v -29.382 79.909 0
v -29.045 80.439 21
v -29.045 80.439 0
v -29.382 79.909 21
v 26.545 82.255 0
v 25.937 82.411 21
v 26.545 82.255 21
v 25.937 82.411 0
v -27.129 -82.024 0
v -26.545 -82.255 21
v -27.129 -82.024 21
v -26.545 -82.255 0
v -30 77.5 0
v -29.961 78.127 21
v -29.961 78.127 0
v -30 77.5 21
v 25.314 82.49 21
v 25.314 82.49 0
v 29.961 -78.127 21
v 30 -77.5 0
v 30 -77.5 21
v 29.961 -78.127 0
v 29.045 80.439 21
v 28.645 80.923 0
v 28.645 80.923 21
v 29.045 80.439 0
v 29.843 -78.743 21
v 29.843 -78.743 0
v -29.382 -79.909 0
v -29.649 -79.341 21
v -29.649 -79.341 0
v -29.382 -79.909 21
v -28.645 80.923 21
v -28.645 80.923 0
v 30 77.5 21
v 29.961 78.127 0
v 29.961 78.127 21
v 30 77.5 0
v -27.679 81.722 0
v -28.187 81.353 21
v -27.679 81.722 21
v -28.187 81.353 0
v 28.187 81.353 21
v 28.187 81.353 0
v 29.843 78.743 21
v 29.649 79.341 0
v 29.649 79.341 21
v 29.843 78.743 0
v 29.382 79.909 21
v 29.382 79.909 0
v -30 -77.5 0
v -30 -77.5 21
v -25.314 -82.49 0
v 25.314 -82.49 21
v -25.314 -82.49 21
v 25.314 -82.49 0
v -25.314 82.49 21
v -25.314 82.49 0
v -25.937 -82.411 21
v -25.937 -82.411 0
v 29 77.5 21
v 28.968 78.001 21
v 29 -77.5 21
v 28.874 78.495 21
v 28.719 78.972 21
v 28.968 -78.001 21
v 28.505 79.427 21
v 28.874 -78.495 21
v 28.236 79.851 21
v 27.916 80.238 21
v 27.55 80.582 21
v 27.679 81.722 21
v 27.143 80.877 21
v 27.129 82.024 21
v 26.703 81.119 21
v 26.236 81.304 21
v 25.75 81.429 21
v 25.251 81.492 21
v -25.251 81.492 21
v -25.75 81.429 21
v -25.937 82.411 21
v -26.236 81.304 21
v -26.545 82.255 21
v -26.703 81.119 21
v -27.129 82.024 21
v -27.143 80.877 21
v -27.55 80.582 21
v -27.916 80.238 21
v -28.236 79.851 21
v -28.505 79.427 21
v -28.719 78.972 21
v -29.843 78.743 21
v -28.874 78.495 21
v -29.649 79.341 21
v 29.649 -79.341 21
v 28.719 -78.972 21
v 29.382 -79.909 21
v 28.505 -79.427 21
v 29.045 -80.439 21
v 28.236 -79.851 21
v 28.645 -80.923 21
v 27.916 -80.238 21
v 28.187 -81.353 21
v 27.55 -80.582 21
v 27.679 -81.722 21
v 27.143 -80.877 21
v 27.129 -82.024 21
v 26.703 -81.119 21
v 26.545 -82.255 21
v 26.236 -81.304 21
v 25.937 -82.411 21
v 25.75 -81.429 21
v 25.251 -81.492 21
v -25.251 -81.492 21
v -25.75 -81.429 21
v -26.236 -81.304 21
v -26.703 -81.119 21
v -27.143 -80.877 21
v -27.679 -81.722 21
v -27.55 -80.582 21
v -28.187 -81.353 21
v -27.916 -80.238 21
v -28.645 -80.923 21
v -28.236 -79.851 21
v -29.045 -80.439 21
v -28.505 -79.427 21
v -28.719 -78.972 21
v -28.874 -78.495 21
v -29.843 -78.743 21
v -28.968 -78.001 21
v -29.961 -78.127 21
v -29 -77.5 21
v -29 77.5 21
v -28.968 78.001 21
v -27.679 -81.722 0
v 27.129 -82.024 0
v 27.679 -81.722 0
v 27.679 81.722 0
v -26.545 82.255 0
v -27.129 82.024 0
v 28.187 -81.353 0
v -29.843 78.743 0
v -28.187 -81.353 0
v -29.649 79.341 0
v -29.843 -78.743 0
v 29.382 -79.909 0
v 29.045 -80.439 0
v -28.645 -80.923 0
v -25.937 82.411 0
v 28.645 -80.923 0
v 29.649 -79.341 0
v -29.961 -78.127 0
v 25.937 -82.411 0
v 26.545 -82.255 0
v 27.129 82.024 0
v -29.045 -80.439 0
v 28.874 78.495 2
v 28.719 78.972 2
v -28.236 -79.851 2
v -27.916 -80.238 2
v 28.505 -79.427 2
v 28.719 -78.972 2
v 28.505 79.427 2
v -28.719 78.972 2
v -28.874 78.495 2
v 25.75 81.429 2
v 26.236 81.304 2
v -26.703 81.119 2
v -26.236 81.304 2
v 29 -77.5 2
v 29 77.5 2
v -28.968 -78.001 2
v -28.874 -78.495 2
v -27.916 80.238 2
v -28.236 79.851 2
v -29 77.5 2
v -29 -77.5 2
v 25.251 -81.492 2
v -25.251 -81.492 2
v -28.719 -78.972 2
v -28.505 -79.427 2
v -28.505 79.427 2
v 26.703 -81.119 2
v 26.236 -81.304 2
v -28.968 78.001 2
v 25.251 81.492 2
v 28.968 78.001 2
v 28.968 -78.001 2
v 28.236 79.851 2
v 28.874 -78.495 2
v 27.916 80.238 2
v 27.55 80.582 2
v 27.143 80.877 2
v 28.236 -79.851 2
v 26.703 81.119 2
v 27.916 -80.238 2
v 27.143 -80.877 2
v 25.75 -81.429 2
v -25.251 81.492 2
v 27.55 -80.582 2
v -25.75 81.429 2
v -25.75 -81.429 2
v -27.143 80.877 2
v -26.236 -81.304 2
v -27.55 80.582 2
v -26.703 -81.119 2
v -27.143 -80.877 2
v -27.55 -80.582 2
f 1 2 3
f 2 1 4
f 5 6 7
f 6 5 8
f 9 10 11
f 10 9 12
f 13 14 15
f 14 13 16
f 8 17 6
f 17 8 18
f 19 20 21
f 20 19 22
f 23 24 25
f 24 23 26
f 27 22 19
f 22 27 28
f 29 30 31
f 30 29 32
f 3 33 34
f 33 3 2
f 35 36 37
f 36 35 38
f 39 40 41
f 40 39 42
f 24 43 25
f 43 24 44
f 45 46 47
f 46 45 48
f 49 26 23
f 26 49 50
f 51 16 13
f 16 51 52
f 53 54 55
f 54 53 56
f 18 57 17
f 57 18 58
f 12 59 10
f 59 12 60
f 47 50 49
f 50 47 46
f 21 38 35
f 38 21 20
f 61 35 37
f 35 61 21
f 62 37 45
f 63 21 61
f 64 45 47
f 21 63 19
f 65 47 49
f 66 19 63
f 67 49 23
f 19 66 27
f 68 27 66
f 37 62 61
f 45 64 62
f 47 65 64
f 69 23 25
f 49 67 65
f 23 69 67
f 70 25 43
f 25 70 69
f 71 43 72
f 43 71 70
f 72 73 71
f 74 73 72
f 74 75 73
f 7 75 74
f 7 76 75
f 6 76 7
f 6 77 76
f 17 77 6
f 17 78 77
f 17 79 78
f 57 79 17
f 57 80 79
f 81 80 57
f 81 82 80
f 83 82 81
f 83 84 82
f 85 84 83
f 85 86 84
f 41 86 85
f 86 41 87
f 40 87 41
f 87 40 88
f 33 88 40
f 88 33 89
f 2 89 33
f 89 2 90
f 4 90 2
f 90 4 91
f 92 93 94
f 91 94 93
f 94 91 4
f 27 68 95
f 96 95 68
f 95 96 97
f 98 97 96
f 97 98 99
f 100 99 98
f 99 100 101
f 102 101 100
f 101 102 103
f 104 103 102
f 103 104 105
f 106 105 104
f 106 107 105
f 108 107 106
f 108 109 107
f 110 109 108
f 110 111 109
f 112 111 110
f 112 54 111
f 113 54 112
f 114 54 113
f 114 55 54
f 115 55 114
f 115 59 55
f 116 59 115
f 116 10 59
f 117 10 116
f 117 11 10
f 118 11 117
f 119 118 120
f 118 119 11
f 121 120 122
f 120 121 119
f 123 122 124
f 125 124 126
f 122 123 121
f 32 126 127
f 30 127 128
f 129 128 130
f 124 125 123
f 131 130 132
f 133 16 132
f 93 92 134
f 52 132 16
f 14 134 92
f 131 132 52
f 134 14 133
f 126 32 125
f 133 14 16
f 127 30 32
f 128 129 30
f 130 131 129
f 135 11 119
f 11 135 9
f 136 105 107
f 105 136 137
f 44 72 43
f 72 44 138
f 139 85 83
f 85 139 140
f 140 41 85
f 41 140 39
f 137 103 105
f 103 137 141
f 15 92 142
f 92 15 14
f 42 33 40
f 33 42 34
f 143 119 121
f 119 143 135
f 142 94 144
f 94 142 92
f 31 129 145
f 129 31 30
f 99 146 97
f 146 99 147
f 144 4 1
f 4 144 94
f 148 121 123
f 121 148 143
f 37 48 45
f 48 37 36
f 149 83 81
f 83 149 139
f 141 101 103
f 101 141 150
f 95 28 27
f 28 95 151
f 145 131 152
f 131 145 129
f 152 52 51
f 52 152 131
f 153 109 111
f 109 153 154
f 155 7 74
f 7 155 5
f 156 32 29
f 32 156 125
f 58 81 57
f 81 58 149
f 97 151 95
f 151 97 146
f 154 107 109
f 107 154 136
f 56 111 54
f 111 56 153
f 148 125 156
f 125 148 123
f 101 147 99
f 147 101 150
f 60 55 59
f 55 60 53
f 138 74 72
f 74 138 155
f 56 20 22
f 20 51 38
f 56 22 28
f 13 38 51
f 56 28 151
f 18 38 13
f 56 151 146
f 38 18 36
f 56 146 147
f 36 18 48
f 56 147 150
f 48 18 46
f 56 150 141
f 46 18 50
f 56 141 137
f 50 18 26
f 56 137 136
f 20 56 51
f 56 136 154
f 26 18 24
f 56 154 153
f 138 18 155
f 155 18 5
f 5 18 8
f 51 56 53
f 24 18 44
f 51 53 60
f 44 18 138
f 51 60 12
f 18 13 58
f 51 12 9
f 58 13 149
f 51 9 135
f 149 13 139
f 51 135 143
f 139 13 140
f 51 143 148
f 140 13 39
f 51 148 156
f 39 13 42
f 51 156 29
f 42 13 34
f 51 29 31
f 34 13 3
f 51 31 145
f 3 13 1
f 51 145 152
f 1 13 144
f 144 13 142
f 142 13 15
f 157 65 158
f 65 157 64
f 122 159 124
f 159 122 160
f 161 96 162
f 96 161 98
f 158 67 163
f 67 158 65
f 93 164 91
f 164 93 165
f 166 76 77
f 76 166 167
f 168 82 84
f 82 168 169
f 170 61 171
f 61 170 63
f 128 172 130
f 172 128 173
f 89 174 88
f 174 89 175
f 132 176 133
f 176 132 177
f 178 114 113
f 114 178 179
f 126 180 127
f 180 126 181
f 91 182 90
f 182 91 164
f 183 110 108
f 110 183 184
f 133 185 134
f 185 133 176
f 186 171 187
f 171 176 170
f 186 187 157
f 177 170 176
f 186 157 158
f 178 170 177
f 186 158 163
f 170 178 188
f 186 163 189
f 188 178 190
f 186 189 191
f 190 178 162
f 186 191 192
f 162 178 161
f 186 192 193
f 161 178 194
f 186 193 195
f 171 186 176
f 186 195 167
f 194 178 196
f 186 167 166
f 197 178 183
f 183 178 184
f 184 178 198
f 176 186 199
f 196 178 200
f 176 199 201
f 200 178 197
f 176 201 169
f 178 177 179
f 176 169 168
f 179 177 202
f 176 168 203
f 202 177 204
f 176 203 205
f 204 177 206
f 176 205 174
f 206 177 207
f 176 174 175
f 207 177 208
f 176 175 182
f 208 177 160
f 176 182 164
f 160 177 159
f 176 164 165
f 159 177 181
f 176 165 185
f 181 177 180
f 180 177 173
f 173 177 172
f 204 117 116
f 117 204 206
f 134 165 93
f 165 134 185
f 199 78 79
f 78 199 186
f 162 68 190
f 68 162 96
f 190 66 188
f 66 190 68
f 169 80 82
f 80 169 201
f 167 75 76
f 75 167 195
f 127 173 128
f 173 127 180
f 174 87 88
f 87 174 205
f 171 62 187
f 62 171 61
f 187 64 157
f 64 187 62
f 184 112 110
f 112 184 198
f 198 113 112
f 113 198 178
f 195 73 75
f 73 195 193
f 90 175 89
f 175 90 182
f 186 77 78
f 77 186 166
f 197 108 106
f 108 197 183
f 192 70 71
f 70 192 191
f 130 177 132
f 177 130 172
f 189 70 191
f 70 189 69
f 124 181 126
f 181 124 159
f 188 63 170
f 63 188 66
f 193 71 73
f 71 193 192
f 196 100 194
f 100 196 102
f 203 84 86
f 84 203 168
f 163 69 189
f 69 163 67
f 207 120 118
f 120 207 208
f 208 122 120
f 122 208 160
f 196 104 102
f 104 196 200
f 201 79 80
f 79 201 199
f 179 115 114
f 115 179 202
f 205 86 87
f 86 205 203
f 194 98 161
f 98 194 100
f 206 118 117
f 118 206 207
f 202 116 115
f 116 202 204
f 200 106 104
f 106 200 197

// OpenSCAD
$fn = 50;


difference() {
	union() {
		hull() {
			translate(v = [-25.0000000000, 77.5000000000, 0]) {
				cylinder(h = 21, r = 5);
			}
			translate(v = [25.0000000000, 77.5000000000, 0]) {
				cylinder(h = 21, r = 5);
			}
			translate(v = [-25.0000000000, -77.5000000000, 0]) {
				cylinder(h = 21, r = 5);
			}
			translate(v = [25.0000000000, -77.5000000000, 0]) {
				cylinder(h = 21, r = 5);
			}
		}
	}
	union() {
		translate(v = [0, 0, 2]) {
			hull() {
				translate(v = [-25.0000000000, 77.5000000000, 0]) {
					cylinder(h = 19, r = 4);
				}
				translate(v = [25.0000000000, 77.5000000000, 0]) {
					cylinder(h = 19, r = 4);
				}
				translate(v = [-25.0000000000, -77.5000000000, 0]) {
					cylinder(h = 19, r = 4);
				}
				translate(v = [25.0000000000, -77.5000000000, 0]) {
					cylinder(h = 19, r = 4);
				}
			}
		}
	}
}
